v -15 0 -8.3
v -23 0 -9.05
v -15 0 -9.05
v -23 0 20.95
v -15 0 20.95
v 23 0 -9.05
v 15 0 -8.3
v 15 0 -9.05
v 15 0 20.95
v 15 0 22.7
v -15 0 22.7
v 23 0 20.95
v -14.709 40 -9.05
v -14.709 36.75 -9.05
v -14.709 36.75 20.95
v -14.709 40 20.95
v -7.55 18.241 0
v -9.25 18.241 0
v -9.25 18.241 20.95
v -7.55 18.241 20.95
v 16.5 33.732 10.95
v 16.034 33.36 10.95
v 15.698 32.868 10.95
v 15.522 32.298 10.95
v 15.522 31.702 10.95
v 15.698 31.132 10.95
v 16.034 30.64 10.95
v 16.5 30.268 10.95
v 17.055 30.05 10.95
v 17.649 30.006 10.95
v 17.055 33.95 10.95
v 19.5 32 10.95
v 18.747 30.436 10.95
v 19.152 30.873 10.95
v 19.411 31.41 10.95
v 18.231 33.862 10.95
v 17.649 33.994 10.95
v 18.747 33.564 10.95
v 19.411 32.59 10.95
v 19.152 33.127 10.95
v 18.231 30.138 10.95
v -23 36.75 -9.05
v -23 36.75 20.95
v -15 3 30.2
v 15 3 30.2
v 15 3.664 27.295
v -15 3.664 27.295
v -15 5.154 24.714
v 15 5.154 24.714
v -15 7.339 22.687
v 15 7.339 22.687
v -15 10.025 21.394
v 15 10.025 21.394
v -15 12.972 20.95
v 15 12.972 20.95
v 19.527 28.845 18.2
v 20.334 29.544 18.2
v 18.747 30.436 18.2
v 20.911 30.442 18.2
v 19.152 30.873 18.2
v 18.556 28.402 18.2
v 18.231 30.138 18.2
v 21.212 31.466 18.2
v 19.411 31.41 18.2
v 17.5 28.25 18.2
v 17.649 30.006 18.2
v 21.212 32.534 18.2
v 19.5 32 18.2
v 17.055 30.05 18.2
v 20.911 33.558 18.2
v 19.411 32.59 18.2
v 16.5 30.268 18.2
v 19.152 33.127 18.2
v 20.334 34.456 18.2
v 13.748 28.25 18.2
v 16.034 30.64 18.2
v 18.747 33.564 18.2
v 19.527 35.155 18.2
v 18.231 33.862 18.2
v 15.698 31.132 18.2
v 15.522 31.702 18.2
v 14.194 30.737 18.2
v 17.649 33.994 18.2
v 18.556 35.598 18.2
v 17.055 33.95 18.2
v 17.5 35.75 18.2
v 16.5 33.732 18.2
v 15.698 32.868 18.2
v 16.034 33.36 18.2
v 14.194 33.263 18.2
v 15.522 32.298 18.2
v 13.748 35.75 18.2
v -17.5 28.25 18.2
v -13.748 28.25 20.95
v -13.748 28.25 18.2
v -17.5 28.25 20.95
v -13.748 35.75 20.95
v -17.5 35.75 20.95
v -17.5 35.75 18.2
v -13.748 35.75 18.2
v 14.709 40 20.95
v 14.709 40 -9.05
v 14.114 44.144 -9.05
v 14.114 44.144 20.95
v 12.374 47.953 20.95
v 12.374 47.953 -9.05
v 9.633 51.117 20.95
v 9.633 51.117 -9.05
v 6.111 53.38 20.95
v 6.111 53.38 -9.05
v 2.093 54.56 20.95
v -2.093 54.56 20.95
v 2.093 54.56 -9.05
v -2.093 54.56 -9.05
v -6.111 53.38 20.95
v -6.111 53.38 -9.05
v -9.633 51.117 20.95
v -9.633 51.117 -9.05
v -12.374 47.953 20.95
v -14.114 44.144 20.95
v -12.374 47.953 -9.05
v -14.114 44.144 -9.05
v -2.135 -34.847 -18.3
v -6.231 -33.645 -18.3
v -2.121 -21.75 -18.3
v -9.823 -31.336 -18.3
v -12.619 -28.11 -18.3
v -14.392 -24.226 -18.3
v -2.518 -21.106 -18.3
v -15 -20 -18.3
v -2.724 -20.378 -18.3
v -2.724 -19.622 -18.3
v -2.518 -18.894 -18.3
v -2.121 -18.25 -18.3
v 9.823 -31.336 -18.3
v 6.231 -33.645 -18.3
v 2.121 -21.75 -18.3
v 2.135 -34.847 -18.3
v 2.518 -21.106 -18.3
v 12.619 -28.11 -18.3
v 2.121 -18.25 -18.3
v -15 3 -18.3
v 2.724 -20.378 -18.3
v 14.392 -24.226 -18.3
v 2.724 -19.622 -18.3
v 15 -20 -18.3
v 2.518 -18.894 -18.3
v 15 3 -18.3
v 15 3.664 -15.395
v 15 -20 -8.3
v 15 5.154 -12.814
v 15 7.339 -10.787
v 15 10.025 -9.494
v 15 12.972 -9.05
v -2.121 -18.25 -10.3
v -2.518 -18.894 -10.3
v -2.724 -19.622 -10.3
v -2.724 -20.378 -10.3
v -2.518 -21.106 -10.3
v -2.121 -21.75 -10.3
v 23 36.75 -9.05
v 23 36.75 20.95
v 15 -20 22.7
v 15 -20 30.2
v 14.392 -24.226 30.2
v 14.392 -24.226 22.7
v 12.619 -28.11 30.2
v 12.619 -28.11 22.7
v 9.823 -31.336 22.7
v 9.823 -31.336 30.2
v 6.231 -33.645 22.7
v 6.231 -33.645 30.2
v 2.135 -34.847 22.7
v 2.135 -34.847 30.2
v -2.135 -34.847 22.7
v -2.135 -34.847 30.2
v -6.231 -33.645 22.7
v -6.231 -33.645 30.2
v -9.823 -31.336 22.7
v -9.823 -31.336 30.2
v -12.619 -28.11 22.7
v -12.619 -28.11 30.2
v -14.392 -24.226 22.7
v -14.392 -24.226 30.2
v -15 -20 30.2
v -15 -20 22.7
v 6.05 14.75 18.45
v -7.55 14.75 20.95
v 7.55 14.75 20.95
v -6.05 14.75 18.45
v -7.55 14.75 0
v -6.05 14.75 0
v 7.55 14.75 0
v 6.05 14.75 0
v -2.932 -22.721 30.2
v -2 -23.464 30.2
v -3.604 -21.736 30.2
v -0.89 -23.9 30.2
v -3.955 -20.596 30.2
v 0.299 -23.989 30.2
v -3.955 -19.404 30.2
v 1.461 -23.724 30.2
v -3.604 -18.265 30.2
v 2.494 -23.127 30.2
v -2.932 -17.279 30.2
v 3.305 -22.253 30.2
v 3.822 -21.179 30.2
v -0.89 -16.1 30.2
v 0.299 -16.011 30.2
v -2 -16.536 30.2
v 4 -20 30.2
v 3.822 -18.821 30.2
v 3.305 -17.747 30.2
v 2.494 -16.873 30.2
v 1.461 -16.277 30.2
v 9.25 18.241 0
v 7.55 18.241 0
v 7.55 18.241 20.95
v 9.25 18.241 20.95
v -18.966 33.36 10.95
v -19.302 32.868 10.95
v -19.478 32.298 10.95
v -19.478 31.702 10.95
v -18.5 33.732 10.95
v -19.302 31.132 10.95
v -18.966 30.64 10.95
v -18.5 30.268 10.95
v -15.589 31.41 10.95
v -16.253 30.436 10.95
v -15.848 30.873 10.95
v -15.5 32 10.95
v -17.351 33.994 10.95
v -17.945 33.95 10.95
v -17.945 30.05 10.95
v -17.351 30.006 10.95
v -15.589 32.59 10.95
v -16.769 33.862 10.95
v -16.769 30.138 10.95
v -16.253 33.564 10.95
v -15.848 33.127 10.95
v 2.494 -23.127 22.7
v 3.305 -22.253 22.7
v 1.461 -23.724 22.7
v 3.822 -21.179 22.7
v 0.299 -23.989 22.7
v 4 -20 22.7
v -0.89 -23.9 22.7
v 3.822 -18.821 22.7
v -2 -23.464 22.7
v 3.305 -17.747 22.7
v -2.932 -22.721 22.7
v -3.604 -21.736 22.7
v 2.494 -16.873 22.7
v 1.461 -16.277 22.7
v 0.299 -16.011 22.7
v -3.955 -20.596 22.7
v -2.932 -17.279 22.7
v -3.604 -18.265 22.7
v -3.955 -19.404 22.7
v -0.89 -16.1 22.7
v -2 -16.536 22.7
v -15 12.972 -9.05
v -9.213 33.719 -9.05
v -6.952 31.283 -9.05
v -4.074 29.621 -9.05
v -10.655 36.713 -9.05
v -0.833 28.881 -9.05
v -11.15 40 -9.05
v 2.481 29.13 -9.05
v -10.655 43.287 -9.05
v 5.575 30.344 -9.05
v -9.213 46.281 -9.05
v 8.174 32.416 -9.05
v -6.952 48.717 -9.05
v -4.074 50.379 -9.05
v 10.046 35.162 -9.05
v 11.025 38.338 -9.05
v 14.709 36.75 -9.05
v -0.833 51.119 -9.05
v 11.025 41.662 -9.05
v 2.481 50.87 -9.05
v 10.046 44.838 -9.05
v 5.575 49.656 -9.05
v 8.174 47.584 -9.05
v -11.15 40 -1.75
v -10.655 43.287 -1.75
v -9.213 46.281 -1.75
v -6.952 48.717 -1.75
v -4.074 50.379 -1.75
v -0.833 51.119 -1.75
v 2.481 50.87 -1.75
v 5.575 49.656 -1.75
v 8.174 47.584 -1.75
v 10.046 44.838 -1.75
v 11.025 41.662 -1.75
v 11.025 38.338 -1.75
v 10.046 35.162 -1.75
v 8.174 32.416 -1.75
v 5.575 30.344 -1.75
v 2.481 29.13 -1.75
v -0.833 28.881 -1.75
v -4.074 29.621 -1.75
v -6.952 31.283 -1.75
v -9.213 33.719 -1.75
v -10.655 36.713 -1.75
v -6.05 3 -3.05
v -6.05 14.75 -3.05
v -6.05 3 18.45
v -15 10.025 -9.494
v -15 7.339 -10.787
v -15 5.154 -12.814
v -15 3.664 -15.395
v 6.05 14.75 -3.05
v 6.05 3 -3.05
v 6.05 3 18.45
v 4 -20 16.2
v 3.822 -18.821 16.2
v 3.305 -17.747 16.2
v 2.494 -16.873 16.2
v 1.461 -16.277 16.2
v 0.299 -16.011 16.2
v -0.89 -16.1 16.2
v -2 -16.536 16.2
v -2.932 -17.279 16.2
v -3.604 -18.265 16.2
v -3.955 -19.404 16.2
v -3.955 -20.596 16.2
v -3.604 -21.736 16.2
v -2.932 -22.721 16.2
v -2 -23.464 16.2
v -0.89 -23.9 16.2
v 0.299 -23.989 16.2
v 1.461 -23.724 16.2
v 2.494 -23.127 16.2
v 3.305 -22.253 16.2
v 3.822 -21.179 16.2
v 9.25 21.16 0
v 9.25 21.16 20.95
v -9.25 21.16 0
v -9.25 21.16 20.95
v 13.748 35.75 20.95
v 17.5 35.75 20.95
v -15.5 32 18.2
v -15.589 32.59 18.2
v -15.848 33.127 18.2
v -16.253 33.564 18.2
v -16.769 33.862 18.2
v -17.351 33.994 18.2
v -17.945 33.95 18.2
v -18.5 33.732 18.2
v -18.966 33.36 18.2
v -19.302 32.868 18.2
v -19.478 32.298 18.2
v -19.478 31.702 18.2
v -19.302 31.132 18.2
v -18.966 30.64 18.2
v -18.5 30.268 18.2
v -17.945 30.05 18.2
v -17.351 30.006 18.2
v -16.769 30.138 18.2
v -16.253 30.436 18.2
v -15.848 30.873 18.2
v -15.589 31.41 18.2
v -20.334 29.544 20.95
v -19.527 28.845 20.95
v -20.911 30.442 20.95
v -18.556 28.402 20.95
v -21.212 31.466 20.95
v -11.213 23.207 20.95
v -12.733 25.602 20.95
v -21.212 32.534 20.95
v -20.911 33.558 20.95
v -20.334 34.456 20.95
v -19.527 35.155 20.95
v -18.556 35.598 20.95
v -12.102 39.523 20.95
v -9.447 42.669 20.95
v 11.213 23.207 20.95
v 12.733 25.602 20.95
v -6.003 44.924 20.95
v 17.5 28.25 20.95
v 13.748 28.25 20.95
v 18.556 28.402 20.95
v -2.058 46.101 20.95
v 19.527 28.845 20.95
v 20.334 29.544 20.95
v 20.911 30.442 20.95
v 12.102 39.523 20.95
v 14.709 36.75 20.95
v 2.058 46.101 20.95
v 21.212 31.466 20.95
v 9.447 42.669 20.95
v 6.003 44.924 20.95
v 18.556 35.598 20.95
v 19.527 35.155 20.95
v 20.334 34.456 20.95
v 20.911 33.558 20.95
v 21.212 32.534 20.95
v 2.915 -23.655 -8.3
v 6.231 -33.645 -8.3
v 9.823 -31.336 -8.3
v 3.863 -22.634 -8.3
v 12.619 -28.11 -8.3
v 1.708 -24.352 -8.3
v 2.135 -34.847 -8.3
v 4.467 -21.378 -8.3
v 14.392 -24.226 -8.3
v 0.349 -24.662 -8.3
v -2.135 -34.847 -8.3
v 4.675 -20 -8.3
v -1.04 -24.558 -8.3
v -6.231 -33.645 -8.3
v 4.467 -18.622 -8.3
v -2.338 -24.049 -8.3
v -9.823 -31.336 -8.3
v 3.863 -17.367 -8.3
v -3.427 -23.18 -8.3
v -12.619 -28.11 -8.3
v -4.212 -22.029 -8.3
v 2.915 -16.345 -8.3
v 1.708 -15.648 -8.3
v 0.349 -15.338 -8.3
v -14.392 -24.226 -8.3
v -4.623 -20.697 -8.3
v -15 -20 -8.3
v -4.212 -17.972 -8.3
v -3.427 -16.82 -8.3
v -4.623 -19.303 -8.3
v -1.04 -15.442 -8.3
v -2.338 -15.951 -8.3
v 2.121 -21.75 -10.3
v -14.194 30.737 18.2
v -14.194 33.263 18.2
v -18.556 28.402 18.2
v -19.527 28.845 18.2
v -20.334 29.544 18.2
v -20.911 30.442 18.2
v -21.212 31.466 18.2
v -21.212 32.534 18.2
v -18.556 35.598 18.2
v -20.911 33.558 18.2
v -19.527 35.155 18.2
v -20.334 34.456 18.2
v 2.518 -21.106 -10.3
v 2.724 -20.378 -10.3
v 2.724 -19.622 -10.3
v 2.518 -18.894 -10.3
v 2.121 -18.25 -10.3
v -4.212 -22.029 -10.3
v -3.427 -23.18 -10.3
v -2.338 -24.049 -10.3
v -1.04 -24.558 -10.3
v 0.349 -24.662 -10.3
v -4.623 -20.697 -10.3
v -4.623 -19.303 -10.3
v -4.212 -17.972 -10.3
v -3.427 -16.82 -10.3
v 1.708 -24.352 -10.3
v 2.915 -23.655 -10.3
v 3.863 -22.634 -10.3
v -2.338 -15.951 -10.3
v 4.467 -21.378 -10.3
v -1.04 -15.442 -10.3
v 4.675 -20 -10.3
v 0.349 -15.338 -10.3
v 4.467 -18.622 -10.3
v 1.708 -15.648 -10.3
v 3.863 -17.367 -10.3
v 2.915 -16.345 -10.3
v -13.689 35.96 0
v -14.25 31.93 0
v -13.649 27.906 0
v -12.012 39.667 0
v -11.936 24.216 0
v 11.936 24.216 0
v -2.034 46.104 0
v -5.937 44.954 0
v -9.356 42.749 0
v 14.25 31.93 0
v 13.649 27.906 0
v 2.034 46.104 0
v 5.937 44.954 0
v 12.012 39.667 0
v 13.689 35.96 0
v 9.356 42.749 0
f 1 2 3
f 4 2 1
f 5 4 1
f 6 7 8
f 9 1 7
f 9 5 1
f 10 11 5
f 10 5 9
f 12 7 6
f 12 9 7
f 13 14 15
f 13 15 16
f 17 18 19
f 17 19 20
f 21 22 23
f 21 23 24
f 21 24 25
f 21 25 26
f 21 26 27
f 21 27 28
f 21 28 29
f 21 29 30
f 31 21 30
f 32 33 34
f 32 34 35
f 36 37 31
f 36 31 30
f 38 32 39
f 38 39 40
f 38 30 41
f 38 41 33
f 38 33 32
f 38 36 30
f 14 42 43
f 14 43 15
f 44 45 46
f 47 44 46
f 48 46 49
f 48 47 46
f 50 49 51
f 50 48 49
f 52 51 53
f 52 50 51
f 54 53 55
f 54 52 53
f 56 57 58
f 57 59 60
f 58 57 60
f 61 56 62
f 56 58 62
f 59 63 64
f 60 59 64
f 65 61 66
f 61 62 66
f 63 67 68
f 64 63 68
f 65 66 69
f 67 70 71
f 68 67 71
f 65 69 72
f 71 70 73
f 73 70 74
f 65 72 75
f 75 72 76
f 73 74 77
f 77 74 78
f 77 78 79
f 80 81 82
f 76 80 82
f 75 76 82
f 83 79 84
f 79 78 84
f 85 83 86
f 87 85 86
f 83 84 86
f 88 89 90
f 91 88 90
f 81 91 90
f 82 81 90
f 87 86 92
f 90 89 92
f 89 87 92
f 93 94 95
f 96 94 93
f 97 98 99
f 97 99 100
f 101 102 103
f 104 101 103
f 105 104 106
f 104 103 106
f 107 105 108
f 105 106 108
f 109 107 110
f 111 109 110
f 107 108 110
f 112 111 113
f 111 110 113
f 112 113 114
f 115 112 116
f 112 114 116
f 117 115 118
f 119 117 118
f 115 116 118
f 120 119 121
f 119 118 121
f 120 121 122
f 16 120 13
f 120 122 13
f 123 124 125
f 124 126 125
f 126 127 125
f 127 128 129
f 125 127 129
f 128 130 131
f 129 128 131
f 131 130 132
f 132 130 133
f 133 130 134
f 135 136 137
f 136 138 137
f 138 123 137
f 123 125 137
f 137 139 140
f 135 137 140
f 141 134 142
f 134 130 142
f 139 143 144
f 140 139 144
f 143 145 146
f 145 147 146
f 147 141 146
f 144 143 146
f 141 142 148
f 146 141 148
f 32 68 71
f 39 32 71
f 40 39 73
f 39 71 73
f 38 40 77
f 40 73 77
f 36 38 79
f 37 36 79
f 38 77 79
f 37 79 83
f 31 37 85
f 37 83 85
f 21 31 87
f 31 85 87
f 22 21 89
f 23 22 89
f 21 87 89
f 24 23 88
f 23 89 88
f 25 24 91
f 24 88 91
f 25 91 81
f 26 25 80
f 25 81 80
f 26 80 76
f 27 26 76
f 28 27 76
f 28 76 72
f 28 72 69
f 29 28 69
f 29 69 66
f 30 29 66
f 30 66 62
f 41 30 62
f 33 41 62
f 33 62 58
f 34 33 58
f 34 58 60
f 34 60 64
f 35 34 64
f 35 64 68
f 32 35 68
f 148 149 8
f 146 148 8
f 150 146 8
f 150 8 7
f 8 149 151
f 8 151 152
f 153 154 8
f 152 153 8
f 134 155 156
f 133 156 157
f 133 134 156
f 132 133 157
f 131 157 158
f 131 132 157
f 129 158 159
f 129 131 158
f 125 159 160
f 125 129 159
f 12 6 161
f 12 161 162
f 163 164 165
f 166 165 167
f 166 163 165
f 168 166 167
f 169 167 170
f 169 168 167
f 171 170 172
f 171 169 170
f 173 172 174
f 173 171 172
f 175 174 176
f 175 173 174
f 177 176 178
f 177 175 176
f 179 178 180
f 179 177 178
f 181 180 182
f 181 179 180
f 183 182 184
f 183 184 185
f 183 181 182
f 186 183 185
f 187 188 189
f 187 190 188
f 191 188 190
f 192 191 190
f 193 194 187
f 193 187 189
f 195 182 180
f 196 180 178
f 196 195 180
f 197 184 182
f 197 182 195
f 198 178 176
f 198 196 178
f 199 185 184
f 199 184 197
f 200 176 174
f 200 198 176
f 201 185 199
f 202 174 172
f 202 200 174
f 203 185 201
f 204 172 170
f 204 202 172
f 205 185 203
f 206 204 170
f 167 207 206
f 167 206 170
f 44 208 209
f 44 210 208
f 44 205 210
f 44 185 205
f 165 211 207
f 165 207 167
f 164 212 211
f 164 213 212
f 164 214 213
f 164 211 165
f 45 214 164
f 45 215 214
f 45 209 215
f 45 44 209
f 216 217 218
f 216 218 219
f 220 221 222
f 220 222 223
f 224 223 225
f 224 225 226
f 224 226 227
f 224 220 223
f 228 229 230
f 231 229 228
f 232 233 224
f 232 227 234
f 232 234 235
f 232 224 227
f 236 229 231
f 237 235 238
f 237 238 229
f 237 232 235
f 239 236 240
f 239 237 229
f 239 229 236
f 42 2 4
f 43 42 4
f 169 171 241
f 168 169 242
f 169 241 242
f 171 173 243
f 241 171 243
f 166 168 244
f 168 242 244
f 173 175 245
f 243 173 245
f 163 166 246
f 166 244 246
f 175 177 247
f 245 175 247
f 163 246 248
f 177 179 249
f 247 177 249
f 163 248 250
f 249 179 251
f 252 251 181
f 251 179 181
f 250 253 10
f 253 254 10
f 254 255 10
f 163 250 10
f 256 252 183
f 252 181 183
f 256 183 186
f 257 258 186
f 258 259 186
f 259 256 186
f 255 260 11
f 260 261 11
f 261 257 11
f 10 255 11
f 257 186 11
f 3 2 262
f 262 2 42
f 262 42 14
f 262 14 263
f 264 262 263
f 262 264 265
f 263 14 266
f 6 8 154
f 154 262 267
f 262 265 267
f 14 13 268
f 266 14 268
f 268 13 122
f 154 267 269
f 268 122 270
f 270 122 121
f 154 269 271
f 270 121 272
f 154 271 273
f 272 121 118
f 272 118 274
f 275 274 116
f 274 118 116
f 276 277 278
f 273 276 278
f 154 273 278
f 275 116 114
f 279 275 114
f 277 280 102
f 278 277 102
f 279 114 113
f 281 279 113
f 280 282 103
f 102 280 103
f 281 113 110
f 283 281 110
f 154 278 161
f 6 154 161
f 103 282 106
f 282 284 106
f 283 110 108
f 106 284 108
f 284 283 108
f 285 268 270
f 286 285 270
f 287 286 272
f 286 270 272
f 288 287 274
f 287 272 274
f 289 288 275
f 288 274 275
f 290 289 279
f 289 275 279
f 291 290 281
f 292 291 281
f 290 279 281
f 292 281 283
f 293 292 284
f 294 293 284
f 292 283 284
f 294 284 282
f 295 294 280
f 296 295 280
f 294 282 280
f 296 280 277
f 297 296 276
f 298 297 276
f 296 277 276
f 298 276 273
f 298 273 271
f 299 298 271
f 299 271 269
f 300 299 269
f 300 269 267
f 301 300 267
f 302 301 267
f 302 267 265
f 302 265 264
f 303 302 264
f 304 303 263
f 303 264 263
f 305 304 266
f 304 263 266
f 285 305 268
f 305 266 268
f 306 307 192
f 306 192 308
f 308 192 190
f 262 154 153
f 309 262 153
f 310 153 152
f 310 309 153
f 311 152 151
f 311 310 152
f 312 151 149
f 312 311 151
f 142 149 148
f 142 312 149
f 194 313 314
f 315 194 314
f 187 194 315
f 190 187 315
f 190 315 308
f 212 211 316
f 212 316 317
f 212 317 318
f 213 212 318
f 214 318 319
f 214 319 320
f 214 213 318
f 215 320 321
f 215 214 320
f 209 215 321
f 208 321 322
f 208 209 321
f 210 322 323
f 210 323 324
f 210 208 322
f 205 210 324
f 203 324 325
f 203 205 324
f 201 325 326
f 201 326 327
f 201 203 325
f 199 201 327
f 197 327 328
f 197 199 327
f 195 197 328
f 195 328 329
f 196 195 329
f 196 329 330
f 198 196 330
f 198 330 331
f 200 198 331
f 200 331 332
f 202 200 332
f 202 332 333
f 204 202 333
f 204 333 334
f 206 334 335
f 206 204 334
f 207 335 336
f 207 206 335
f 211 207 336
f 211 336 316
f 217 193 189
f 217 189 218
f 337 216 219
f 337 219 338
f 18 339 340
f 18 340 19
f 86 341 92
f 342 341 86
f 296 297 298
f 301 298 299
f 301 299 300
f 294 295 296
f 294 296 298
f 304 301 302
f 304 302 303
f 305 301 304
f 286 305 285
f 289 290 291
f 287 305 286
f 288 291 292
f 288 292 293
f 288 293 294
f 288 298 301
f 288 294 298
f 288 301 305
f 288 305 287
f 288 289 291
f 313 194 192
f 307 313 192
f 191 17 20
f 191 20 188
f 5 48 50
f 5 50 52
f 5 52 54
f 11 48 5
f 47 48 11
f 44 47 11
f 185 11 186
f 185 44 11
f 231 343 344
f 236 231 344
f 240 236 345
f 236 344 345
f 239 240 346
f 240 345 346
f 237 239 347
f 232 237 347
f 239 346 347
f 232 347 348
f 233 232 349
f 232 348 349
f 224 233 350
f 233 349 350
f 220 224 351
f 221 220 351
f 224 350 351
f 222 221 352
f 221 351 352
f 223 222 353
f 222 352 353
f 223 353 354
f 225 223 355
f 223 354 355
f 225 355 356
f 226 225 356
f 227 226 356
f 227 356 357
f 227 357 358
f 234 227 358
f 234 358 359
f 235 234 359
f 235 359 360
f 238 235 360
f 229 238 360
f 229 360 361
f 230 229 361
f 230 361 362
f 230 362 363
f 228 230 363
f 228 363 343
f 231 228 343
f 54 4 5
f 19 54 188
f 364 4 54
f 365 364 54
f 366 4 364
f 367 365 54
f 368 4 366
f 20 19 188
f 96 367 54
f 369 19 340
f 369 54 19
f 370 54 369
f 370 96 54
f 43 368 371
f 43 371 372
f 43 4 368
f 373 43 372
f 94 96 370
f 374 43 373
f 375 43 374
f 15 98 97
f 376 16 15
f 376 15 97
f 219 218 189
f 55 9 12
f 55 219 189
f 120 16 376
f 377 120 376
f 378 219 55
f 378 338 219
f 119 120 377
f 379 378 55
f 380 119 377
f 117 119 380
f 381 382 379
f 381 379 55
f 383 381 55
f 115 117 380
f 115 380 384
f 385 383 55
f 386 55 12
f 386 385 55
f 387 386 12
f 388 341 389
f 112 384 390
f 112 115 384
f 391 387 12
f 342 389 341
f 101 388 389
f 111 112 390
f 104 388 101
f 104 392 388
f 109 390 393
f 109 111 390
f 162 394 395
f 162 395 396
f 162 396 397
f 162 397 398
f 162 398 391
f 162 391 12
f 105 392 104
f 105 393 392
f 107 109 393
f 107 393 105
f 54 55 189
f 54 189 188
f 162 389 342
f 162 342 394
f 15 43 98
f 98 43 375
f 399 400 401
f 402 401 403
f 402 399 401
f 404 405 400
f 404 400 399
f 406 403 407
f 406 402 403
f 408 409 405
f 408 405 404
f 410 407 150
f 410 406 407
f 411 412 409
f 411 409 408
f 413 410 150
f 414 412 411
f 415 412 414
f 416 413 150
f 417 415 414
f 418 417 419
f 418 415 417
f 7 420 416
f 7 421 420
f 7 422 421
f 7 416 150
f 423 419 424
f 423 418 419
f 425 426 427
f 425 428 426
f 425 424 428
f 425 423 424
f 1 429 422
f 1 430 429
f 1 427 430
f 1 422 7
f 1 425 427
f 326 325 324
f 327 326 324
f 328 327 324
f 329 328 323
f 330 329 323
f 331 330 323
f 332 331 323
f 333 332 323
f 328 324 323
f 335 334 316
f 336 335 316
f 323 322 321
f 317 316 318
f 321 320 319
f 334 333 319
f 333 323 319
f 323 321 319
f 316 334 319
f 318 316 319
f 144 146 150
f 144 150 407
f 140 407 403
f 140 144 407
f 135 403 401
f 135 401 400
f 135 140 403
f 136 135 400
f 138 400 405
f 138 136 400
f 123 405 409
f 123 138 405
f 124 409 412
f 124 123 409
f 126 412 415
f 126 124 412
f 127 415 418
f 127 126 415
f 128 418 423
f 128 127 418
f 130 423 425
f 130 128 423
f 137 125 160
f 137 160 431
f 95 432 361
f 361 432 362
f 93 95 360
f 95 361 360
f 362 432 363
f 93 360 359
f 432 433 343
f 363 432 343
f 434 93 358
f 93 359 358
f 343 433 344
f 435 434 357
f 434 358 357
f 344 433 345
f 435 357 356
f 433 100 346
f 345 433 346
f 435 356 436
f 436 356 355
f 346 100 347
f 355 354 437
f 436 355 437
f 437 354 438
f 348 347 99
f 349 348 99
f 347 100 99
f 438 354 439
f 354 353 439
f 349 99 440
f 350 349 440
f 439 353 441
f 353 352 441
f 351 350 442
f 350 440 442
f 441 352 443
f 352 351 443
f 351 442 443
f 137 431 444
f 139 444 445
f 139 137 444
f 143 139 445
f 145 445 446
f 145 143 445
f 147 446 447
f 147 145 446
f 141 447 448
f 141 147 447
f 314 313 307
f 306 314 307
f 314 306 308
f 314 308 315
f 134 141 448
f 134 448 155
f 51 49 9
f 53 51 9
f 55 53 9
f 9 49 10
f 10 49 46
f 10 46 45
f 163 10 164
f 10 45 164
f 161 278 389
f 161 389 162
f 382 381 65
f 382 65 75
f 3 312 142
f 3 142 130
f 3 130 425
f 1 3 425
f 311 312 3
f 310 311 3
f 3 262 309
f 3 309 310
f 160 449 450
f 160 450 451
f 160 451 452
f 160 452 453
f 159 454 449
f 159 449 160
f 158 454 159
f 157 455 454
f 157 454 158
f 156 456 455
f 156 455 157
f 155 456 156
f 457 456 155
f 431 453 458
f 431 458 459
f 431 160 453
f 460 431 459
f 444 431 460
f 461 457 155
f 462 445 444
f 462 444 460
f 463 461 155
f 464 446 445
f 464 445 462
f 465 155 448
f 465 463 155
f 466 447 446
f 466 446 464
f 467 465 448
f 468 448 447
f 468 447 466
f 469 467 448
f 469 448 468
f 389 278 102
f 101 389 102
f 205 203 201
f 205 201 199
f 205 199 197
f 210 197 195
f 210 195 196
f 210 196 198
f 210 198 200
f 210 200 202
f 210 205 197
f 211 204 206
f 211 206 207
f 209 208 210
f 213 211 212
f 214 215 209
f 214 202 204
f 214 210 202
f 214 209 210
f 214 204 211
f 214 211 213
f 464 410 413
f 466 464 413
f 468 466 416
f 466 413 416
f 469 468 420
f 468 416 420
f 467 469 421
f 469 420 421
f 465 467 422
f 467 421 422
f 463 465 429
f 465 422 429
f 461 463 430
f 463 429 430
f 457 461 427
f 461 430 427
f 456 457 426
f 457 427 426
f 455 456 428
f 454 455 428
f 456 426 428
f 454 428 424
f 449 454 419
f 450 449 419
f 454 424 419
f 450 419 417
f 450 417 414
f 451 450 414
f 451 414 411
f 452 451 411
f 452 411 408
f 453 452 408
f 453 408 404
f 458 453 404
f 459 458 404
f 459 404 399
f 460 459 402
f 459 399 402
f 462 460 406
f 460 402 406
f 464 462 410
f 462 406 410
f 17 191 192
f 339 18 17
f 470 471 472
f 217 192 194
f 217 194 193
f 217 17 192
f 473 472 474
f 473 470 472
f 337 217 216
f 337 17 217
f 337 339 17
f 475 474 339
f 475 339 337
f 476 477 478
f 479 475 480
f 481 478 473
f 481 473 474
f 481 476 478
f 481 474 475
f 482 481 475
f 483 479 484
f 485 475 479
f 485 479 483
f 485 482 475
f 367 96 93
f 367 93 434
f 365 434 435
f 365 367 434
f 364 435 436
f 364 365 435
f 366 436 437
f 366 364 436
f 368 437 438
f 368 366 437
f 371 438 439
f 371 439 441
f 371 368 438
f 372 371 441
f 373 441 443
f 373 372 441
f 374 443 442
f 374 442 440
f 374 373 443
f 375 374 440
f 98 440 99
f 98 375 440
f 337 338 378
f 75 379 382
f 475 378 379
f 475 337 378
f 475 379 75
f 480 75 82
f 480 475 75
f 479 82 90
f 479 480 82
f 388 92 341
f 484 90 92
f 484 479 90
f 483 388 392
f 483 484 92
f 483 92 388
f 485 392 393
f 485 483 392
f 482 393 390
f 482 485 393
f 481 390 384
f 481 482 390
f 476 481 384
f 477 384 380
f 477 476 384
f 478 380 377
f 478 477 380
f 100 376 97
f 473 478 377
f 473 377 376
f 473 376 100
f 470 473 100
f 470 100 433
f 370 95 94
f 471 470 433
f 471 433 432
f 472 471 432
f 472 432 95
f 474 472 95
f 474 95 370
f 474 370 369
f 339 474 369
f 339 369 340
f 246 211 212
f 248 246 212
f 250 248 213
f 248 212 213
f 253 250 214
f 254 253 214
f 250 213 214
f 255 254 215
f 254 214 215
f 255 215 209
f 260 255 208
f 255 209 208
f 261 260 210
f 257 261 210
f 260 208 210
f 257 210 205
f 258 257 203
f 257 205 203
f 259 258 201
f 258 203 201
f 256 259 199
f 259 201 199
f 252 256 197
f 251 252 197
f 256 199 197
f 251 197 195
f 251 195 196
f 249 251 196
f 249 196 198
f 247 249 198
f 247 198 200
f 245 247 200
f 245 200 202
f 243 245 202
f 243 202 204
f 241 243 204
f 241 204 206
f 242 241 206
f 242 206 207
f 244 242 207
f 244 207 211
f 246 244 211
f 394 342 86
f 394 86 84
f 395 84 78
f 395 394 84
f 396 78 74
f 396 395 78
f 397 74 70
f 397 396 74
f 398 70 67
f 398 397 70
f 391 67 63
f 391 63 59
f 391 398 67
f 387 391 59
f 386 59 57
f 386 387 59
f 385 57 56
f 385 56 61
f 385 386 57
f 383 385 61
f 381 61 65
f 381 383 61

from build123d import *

# Parameters (mm, degrees)
BOSS_EXTRUDE1_DEPTH      = 20.95
BOSS_EXTRUDE2_START      = -9.05
BOSS_EXTRUDE2_DEPTH      = 9.05
SKETCH6_R                = 2
CUT_EXTRUDE2_DEPTH       = 10
CUT_EXTRUDE3_DEPTH       = 2.75
CUT_EXTRUDE4_DEPTH       = 67.499081444
CUT_EXTRUDE4_DEPTH_BACK  = 67.499081444
SKETCH8_W                = 8.290514233
SKETCH8_H                = 3.25
SKETCH11_R               = 11.15
BEARING_HOLE_DEPTH       = 7.3
SKETCH9_W                = 12.1
SKETCH9_H                = 21.5
WIRE_HOLE_DEPTH          = 62.170258319
SKETCH12_W               = 46
SKETCH12_H               = 30
BOSS_EXTRUDE3_DEPTH      = 0.0001
BOSS_EXTRUDE4_DEPTH      = 9.25
BOSS_EXTRUDE4_DEPTH_BACK = 39.25
SKETCH14_W               = 31
SKETCH14_H               = 35
CUT_EXTRUDE5_DEPTH       = 74.138005393
SKETCH15_R               = 4
CUT_EXTRUDE6_DEPTH       = 77.644489906
SKETCH17_R               = 6.169612062
BOSS_EXTRUDE5_DEPTH      = 10
SKETCH18_R               = 4
BOSS_EXTRUDE6_DEPTH      = 14
SKETCH19_R               = 4.675
CUT_EXTRUDE7_DEPTH       = 2
BOSS_EXTRUDE7_START      = -39.25
SKETCH20_W               = 30
SKETCH20_H               = 3
BOSS_EXTRUDE7_DEPTH      = 48.5
FILLET1_R                = 10


with BuildPart() as part:
    # Sketch2 → Boss-Extrude1 (new body)
    with BuildSketch(Plane.XY):
        with BuildLine():
            Line((-14.709485767, 40), (-23, 40))
            Line((-23, 40), (-23, 0))
            Line((-23, 0), (23, 0))
            Line((23, 0), (23, 40))
            Line((23, 40), (14.709485767, 40))
            ThreePointArc((14.709485767, 40), (0, 54.709485767), (-14.709485767, 40))
        make_face()
        with BuildLine():
            Line((-7.55, 18.241114036), (-7.55, 14.75))
            Line((-7.55, 14.75), (7.55, 14.75))
            Line((7.55, 14.75), (7.55, 18.241114036))
            Line((7.55, 18.241114036), (9.25, 18.241114036))
            Line((9.25, 18.241114036), (9.25, 21.160258306))
            ThreePointArc((9.25, 21.160258306), (0, 46.25), (-9.25, 21.160258306))
            Line((-9.25, 21.160258306), (-9.25, 18.241114036))
            Line((-9.25, 18.241114036), (-7.55, 18.241114036))
        make_face(mode=Mode.SUBTRACT)
    extrude(amount=BOSS_EXTRUDE1_DEPTH)

    # Sketch3 → Boss-Extrude2 (add)
    with BuildSketch(Plane.XY.offset(BOSS_EXTRUDE2_START)):
        with BuildLine():
            Line((-14.709485767, 40), (-23, 40))
            Line((-23, 40), (-23, 0))
            Line((-23, 0), (23, 0))
            Line((23, 0), (23, 40))
            Line((23, 40), (14.709485767, 40))
            ThreePointArc((14.709485767, 40), (0, 54.709485767), (-14.709485767, 40))
        make_face()
    extrude(amount=BOSS_EXTRUDE2_DEPTH)

    # Sketch6 → Cut-Extrude2 (cut)
    with BuildSketch(Plane.XY.offset(20.95)):
        with Locations((-17.5, 32)):
            Circle(SKETCH6_R)
        with Locations((17.5, 32)):
            Circle(SKETCH6_R)
    extrude(amount=-CUT_EXTRUDE2_DEPTH, mode=Mode.SUBTRACT)

    # Sketch7 → Cut-Extrude3 (cut)
    with BuildSketch(Plane.XY.offset(20.95)):
        with BuildLine():
            Line((-17.5, 35.75), (17.5, 35.75))
            ThreePointArc((17.5, 35.75), (21.25, 32), (17.5, 28.25))
            Line((17.5, 28.25), (-17.5, 28.25))
            ThreePointArc((-17.5, 28.25), (-21.25, 32), (-17.5, 35.75))
        make_face()
    extrude(amount=-CUT_EXTRUDE3_DEPTH, mode=Mode.SUBTRACT)

    # Sketch8 → Cut-Extrude4 (cut, two sides: drawn at the far end of the back side and taken through both)
    with BuildSketch(Plane.XY.offset(20.95).offset(-CUT_EXTRUDE4_DEPTH_BACK)):
        with Locations((-18.854742884, 38.375)):
            Rectangle(SKETCH8_W, SKETCH8_H)
        with Locations((18.854742884, 38.375)):
            Rectangle(SKETCH8_W, SKETCH8_H)
    extrude(amount=CUT_EXTRUDE4_DEPTH + CUT_EXTRUDE4_DEPTH_BACK, mode=Mode.SUBTRACT)

    # Sketch11 → Bearing Hole (cut)
    with BuildSketch(Plane(origin=(0, 0, -9.05), x_dir=(-1, 0, 0), z_dir=(0, 0, -1))):
        with Locations((0, 40)):
            Circle(SKETCH11_R)
    extrude(amount=-BEARING_HOLE_DEPTH, mode=Mode.SUBTRACT)

    # Sketch9 → Wire Hole (cut, through all)
    with BuildSketch(Plane(origin=(0, 14.75, -19.25), x_dir=(-1, 0, 0), z_dir=(0, 1, 0))):
        with Locations((0, 26.95)):
            Rectangle(SKETCH9_W, SKETCH9_H)
    extrude(amount=-WIRE_HOLE_DEPTH, mode=Mode.SUBTRACT)

    # Sketch12 → Boss-Extrude3 (add)
    with BuildSketch(Plane.XZ):
        with Locations((0, 5.95)):
            Rectangle(SKETCH12_W, SKETCH12_H)
    extrude(amount=BOSS_EXTRUDE3_DEPTH)

    # Sketch13 → Boss-Extrude4 (add, two sides: drawn at the far end of the back side and taken through both)
    with BuildSketch(Plane.XY.offset(20.95).offset(-BOSS_EXTRUDE4_DEPTH_BACK)):
        with BuildLine():
            Line((-15, -0.0001), (15, -0.0001))
            Line((15, -0.0001), (15, -20.0001))
            ThreePointArc((15, -20.0001), (0, -35.0001), (-15, -20.0001))
            Line((-15, -20.0001), (-15, -0.0001))
        make_face()
    extrude(amount=BOSS_EXTRUDE4_DEPTH + BOSS_EXTRUDE4_DEPTH_BACK)

    # Sketch14 → Cut-Extrude5 (cut, through all)
    with BuildSketch(Plane.ZY.offset(15)):
        with Locations((7.2, -17.5001)):
            Rectangle(SKETCH14_W, SKETCH14_H)
    extrude(amount=-CUT_EXTRUDE5_DEPTH, mode=Mode.SUBTRACT)


with BuildPart() as cut_extrude5_piece_1:
    # of the separate pieces the step leaves, piece 1, a body of its own (cut_extrude5_pieces)
    add(part.part.solids().sort_by_distance((14.709485767, 40, 20.95))[0])


with BuildPart() as cut_extrude5_piece_2:
    # of the separate pieces the step leaves, piece 2, a body of its own (cut_extrude5_pieces)
    add(part.part.solids().sort_by_distance((-15, -0.0001, 30.2))[0])


with BuildPart() as cut_extrude6_tool:
    # Sketch15 → Cut-Extrude6 (new, through all)
    with BuildSketch(Plane.XY.offset(30.2)):
        with Locations((0, -20.0001)):
            Circle(SKETCH15_R)
    extrude(amount=-CUT_EXTRUDE6_DEPTH)


with BuildPart() as cut_extrude5_piece_1_1:
    add(cut_extrude5_piece_1.part)

    # Cut-Extrude6: cut by cut_extrude6_tool
    add(cut_extrude6_tool.part, mode=Mode.SUBTRACT)

    # Sketch17 → Boss-Extrude5 (add)
    with BuildSketch(Plane(origin=(0, 0, -18.3), x_dir=(-1, 0, 0), z_dir=(0, 0, -1))):
        with Locations((0, -20.0001)):
            Circle(SKETCH17_R)
        with BuildLine():
            Line((-2.121320344, -18.2501), (2.121320344, -18.2501))
            ThreePointArc((2.121320344, -18.2501), (2.75, -20.0001), (2.121320344, -21.7501))
            Line((2.121320344, -21.7501), (-2.121320344, -21.7501))
            ThreePointArc((-2.121320344, -21.7501), (-2.75, -20.0001), (-2.121320344, -18.2501))
        make_face(mode=Mode.SUBTRACT)
    extrude(amount=-BOSS_EXTRUDE5_DEPTH)

    # Sketch19 → Cut-Extrude7 (cut)
    with BuildSketch(Plane.XY.offset(-8.3)):
        with Locations((0, -20.0001)):
            Circle(SKETCH19_R)
    extrude(amount=-CUT_EXTRUDE7_DEPTH, mode=Mode.SUBTRACT)



with BuildPart() as cut_extrude5_piece_2_1:
    add(cut_extrude5_piece_2.part)

    # Cut-Extrude6: cut by cut_extrude6_tool
    add(cut_extrude6_tool.part, mode=Mode.SUBTRACT)


with BuildPart() as body_3:
    # Sketch18 → Boss-Extrude6 (new body)
    with BuildSketch(Plane.XY.offset(30.2)):
        with Locations((0, -20.0001)):
            Circle(SKETCH18_R)
    extrude(amount=-BOSS_EXTRUDE6_DEPTH)


with BuildPart() as cut_extrude5_piece_1_2:
    add(cut_extrude5_piece_1_1.part)

    add(cut_extrude5_piece_2_1.part)  # Boss-Extrude7 merges Cut-Extrude5 piece 2
    # Sketch20 → Boss-Extrude7 (add)
    with BuildSketch(Plane.XY.offset(20.95).offset(BOSS_EXTRUDE7_START)):
        with Locations((0, 1.4999)):
            Rectangle(SKETCH20_W, SKETCH20_H)
    extrude(amount=BOSS_EXTRUDE7_DEPTH)

    # Fillet1
    # the kernel refuses this fillet: 10 mm, written as the material it adds along each edge
    with BuildSketch(Plane(origin=(-15, 2.9999, -9.05), x_dir=(0, 0, -1), z_dir=(1, 0, 0))) as fillet1_piece_1:
        with BuildLine():
            CenterArc((10, 9.971835338), FILLET1_R, 180, 85.698777695)
            Line((0, 9.971835338), (-0.2, 9.971835338))
            Line((-0.2, 9.971835338), (-0.2, 0))
            Line((-0.2, 0), (0, -0.2))
            ThreePointArc((0, -0.2), (4.625, -0.2), (9.235, -0.199436707))
            Line((9.235, -0.199436707), (9.25, 0))
        make_face()
    extrude(amount=30)
    with BuildSketch(Plane(origin=(-15, 2.9999, 20.95), x_dir=(0, 1, 0), z_dir=(1, 0, 0))) as fillet1_piece_2:
        with BuildLine():
            CenterArc((9.971835338, 10), FILLET1_R, 184.301222305, 85.698777695)
            Line((0, 9.25), (-0.199436707, 9.235))
            ThreePointArc((-0.199436707, 9.235), (-0.2, 4.625), (-0.2, 0))
            Line((-0.2, 0), (0, -0.2))
            Line((0, -0.2), (9.971835338, -0.2))
            Line((9.971835338, -0.2), (9.971835338, 0))
        make_face()
    extrude(amount=30)


solid = Compound([body_3.part, cut_extrude5_piece_1_2.part])
